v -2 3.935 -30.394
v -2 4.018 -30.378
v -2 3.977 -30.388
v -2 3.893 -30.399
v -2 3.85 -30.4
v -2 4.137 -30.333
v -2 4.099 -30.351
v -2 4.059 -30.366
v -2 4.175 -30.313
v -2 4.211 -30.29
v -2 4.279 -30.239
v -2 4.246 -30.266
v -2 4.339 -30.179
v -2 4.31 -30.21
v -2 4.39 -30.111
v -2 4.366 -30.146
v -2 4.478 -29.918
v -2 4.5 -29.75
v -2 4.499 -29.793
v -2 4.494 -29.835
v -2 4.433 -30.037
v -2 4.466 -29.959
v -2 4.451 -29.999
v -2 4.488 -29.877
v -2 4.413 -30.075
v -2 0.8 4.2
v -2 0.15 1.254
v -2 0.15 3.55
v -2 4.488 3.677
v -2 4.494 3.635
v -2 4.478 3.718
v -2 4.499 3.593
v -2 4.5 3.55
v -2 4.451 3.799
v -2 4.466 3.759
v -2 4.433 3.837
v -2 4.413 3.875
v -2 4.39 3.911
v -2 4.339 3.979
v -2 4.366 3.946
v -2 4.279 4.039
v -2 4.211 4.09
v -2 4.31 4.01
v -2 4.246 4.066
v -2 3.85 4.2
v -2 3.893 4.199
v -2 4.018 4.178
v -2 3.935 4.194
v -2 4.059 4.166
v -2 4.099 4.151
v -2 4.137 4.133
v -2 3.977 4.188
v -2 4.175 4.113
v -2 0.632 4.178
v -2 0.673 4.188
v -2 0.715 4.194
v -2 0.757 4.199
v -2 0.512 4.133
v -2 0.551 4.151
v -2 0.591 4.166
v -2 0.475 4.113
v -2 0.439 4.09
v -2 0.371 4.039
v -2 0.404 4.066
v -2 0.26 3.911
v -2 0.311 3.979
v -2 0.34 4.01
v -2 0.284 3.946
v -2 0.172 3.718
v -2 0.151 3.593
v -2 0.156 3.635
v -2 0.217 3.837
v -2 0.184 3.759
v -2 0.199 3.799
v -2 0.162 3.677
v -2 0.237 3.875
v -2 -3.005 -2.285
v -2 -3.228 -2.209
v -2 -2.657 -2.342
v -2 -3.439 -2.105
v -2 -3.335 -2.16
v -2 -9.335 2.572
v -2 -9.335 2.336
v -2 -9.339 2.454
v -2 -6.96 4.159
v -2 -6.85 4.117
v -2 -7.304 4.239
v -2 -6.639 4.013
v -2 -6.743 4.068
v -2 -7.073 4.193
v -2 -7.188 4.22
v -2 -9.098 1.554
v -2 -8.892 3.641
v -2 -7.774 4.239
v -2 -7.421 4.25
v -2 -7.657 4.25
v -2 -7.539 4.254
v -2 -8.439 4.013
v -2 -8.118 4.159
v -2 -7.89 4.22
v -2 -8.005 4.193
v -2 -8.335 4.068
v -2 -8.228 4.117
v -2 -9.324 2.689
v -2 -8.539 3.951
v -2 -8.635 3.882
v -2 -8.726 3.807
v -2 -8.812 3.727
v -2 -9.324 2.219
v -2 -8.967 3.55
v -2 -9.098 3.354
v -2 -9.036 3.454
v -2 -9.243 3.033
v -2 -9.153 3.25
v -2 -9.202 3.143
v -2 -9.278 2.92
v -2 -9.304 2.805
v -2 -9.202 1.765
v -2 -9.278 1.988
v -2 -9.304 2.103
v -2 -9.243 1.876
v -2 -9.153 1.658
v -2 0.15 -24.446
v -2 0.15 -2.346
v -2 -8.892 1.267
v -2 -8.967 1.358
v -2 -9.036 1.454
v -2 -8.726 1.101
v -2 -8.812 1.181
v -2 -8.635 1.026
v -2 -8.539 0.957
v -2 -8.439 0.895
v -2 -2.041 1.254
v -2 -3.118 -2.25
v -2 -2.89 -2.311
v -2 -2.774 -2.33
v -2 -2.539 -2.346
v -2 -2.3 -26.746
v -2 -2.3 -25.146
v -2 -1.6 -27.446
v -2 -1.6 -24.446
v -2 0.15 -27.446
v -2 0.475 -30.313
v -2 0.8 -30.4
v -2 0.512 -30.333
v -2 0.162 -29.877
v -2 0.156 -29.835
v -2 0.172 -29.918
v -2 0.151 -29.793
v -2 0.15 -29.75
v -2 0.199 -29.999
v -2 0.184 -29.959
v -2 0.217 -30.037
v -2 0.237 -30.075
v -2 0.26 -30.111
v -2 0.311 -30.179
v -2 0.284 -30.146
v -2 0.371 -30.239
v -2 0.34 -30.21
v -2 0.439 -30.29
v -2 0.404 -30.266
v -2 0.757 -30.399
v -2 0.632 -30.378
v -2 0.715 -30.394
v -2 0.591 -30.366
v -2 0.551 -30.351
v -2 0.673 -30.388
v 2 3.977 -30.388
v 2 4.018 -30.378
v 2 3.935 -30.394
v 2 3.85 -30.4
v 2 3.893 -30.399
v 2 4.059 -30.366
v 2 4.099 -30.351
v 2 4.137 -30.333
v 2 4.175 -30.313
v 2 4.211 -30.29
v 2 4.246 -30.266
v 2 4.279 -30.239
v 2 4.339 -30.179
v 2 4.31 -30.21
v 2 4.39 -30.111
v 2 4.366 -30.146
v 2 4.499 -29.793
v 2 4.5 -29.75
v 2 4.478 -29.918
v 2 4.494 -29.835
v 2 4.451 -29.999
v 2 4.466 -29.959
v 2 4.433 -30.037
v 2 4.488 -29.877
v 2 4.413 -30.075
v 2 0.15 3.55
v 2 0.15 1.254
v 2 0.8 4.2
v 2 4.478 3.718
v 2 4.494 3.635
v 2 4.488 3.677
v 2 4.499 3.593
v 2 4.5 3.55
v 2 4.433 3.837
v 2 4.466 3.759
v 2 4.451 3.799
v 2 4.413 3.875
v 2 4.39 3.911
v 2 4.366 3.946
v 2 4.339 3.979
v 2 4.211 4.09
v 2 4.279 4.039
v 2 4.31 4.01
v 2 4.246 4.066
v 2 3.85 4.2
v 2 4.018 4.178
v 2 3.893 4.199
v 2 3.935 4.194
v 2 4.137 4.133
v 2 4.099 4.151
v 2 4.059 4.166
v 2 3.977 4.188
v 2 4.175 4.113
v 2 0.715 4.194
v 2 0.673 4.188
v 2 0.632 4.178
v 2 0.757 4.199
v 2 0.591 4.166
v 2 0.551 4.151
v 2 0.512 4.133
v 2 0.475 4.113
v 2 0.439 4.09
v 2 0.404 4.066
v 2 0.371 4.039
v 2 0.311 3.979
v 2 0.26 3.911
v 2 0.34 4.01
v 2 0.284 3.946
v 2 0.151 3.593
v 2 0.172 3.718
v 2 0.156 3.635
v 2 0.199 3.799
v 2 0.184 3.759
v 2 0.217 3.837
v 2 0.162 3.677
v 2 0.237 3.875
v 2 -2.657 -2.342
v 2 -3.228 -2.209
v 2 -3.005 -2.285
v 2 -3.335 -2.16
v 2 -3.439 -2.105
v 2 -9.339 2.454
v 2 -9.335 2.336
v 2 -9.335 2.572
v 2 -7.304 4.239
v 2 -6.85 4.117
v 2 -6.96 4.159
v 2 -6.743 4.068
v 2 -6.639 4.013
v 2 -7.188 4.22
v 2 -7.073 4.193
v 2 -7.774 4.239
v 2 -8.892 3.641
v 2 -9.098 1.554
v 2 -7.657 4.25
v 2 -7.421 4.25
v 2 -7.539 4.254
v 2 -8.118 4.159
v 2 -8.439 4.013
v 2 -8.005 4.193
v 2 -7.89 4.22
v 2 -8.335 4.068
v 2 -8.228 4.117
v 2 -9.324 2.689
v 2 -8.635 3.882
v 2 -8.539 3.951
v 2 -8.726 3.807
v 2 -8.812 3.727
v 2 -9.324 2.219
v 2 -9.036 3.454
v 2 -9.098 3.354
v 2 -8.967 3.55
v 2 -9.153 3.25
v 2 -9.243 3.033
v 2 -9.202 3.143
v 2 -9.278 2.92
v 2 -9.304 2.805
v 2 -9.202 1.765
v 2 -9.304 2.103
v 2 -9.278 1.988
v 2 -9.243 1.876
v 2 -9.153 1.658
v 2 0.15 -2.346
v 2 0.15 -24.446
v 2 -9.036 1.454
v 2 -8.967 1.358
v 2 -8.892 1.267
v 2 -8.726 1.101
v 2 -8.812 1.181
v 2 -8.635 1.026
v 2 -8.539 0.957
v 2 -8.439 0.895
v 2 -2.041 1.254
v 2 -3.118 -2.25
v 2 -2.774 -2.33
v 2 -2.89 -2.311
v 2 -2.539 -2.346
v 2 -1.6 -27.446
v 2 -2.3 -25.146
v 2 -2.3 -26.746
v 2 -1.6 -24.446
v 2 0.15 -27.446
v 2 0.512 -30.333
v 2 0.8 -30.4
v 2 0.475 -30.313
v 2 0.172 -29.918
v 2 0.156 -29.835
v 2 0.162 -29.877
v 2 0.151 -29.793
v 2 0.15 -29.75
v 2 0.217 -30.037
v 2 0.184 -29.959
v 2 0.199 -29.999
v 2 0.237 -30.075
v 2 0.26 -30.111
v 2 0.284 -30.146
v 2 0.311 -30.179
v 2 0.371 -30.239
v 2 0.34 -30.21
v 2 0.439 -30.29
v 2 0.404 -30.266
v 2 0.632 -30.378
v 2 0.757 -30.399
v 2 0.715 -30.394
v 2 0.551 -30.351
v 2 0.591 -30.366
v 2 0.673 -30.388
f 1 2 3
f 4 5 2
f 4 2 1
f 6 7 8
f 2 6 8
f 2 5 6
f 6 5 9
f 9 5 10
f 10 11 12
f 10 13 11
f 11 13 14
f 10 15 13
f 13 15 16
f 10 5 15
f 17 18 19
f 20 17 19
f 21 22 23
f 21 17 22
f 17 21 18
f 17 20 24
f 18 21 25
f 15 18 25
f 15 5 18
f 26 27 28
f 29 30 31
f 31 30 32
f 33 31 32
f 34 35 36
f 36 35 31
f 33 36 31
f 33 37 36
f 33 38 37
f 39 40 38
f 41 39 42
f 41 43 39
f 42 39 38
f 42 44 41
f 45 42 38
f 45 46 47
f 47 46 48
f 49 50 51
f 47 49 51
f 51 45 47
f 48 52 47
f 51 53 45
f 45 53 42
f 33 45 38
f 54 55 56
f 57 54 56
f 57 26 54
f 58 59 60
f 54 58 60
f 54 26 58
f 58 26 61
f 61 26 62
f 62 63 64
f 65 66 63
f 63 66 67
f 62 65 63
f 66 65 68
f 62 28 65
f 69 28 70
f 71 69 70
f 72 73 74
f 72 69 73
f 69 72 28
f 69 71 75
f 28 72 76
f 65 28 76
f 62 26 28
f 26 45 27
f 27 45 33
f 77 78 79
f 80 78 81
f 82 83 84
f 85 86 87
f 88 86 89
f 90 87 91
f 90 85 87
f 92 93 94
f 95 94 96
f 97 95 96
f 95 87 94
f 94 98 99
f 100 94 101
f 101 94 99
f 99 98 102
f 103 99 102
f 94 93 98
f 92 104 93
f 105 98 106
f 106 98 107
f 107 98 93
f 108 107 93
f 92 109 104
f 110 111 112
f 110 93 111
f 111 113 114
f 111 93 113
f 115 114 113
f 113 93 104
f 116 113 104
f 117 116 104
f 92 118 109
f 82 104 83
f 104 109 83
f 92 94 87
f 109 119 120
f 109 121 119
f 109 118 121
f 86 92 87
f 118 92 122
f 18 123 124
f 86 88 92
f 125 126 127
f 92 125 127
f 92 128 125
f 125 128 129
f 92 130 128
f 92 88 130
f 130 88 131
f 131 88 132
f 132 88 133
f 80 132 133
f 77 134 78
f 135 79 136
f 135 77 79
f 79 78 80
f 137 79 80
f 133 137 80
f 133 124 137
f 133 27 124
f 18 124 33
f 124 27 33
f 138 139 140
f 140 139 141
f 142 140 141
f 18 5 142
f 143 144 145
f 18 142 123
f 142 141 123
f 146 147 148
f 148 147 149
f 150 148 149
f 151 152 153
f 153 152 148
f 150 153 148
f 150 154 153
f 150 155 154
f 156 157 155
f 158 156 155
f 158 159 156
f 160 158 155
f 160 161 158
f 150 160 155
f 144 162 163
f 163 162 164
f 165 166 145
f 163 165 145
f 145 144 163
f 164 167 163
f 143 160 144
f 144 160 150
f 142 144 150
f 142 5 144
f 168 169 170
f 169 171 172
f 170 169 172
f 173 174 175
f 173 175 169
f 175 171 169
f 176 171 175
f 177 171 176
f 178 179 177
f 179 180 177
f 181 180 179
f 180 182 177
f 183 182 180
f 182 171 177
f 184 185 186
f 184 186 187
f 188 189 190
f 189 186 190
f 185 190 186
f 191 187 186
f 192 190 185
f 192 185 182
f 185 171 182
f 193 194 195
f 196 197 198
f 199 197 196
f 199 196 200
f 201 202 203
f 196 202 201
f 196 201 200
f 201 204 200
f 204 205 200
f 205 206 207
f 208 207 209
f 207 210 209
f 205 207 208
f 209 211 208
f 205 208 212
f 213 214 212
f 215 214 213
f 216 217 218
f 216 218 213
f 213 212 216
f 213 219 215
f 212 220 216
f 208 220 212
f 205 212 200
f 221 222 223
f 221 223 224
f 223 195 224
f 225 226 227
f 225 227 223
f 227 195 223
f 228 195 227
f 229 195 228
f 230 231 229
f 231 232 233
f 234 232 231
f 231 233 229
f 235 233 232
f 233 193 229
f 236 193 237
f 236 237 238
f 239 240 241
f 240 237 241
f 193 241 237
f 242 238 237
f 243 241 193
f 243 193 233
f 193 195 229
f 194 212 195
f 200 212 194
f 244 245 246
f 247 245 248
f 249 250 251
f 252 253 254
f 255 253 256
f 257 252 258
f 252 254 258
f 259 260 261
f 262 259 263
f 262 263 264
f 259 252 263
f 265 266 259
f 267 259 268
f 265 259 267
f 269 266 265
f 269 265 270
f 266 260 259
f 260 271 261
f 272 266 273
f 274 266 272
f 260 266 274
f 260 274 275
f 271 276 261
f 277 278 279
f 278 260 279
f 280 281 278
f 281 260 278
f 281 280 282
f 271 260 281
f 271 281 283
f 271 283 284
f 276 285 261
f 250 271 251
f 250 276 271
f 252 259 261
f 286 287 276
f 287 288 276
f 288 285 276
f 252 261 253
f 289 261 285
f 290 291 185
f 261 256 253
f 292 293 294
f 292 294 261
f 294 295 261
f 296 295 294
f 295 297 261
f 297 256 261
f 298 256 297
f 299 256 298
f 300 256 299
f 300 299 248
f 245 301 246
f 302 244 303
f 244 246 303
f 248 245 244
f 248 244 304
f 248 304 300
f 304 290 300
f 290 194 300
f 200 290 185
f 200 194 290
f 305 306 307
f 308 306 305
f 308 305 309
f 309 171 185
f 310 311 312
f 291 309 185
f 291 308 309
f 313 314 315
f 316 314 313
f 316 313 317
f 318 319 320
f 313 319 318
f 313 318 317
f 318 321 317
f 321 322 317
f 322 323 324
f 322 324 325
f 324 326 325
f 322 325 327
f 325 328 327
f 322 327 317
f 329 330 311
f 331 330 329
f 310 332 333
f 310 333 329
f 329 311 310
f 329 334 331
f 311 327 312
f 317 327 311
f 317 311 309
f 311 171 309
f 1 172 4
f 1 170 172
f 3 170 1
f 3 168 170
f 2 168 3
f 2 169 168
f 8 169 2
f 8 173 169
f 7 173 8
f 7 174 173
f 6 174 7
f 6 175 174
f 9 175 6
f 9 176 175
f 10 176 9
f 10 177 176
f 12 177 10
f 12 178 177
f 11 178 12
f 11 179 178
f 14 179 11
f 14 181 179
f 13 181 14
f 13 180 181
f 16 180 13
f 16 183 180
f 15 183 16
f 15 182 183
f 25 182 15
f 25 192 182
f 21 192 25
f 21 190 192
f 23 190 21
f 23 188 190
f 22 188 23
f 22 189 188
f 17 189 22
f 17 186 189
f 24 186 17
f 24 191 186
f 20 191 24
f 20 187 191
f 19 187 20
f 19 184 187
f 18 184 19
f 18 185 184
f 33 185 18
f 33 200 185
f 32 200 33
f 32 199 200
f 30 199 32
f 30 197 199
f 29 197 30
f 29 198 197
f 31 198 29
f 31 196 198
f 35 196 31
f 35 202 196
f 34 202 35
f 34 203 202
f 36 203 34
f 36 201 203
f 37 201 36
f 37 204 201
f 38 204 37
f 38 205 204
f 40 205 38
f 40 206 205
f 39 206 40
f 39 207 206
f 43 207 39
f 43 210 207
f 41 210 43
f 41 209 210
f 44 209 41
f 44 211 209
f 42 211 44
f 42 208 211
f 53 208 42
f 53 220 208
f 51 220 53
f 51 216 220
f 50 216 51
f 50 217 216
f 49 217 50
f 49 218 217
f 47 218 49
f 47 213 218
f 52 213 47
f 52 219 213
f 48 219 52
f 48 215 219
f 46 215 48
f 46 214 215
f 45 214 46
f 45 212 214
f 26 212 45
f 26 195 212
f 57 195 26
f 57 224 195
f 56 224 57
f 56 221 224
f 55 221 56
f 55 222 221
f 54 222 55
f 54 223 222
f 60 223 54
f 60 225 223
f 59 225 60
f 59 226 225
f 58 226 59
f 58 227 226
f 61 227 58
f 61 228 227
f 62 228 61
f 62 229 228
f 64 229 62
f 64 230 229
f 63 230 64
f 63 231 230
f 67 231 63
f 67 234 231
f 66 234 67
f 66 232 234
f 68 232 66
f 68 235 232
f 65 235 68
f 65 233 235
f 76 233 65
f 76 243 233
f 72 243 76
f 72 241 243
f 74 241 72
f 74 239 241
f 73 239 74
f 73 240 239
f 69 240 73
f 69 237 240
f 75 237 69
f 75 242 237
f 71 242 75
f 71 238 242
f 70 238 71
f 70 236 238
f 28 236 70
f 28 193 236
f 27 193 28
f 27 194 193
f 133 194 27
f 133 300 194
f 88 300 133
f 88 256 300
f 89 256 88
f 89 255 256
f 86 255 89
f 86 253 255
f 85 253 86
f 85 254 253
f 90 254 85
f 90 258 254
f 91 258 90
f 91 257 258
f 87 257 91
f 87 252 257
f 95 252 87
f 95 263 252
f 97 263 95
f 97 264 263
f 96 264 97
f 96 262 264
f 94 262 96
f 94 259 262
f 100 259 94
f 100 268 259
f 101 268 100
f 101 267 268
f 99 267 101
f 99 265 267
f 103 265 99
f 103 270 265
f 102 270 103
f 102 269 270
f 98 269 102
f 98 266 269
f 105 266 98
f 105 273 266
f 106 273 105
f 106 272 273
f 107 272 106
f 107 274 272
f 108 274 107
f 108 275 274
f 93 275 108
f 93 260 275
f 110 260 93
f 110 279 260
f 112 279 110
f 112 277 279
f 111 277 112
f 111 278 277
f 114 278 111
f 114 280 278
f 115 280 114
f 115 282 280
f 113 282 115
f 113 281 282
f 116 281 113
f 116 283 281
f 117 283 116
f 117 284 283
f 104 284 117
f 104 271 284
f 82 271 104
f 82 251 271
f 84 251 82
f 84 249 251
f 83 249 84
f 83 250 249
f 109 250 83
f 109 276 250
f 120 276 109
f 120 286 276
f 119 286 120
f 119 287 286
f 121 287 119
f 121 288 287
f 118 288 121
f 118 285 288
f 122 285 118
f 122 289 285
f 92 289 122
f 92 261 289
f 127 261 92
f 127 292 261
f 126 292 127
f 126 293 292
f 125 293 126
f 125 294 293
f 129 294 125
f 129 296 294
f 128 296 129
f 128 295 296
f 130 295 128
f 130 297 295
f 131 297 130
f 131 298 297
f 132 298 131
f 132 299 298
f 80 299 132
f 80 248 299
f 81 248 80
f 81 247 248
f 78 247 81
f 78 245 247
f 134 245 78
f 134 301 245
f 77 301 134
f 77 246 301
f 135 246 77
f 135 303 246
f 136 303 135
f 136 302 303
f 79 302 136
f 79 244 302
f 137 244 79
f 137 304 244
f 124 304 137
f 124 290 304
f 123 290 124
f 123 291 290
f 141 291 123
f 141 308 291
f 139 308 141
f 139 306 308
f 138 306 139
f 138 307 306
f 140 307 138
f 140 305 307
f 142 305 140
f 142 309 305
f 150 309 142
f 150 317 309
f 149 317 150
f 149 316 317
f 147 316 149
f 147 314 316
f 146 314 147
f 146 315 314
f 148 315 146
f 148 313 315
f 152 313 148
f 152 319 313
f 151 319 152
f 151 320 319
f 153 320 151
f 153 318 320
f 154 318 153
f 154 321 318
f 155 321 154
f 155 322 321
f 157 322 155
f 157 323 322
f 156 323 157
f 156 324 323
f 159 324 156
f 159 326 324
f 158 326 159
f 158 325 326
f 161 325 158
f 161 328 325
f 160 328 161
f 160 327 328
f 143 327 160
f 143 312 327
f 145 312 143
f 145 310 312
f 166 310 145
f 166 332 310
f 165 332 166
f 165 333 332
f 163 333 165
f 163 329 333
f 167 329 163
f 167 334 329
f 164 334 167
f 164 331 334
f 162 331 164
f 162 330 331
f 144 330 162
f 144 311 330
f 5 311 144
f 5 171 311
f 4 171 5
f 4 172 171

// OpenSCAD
// Pegboard anchor — millimeters; X width, Y toward you, Z up.
// use <pegboard_anchor.scad>; then pegboard_anchor(board_thickness=3.94);
// Fuse your mount with the front spine at Y=spine_depth (default4.5).
// Thickness changes require a new fit/motion check. Do not scale the whole part.
// Canonical validated CAD is generated by anchor.py + motion_design.py.
$fn = 96;

module pegboard_anchor(
    board_thickness = 3.94,
    hole_diameter = 6.35,
    pitch = 25.4,
    width = 4.0,
    neck_height = 3.6,
    spine_depth = 4.5,
    spine_height = 34.6,
    pull_clearance = 0.47,
    elbow_offset = undef,
    tongue_run = 5.0,
    tongue_rise = 3.0,
    locator_depth = 2.3,
    locator_height = 3.0,
    front_gap = 0.15,
    seat_drop = 0.12
) {
    $fn = 96;
    assert(board_thickness>0 && hole_diameter>width && width>0);
    chord_half = sqrt(hole_diameter*hole_diameter-width*width)/2;
    assert(neck_height < 2*chord_half);
    z0 = -chord_half + neck_height/2 + seat_drop;
    slope = tongue_rise/tongue_run;
    radius = neck_height/2;
    elbow = is_undef(elbow_offset) ? pull_clearance-front_gap
        -(2*chord_half-radius)/slope+radius*sqrt(1+1/(slope*slope))
        : elbow_offset;
    yrear = -board_thickness-elbow;
    chamfer = min(0.7, locator_depth*0.35, locator_height*0.3);
    zl = -pitch+z0;
    // [2D u,2D v,extrusion] -> global[Y,Z,X].
    multmatrix([[0,0,1,0],[1,0,0,0],[0,1,0,0],[0,0,0,1]])
    linear_extrude(height=width,center=true,convexity=10)
    union() {
        hull() {
            translate([1.4,z0]) circle(d=neck_height);
            translate([yrear,z0]) circle(d=neck_height);
        }
        hull() {
            translate([yrear,z0]) circle(d=neck_height);
            translate([yrear-tongue_run,z0+tongue_rise]) circle(d=neck_height);
        }
        offset(r=0.65) offset(delta=-0.65)
            translate([front_gap,4.2-spine_height])
                square([spine_depth-front_gap,spine_height]);
        polygon([
            [0.6,zl-locator_height/2],
            [-locator_depth+chamfer,zl-locator_height/2],
            [-locator_depth,zl-locator_height/2+chamfer],
            [-locator_depth,zl+locator_height/2-chamfer],
            [-locator_depth+chamfer,zl+locator_height/2],
            [0.6,zl+locator_height/2]
        ]);
    }
}

// Preview is the default anchor. use<> excludes this top-level preview.
pegboard_anchor();
